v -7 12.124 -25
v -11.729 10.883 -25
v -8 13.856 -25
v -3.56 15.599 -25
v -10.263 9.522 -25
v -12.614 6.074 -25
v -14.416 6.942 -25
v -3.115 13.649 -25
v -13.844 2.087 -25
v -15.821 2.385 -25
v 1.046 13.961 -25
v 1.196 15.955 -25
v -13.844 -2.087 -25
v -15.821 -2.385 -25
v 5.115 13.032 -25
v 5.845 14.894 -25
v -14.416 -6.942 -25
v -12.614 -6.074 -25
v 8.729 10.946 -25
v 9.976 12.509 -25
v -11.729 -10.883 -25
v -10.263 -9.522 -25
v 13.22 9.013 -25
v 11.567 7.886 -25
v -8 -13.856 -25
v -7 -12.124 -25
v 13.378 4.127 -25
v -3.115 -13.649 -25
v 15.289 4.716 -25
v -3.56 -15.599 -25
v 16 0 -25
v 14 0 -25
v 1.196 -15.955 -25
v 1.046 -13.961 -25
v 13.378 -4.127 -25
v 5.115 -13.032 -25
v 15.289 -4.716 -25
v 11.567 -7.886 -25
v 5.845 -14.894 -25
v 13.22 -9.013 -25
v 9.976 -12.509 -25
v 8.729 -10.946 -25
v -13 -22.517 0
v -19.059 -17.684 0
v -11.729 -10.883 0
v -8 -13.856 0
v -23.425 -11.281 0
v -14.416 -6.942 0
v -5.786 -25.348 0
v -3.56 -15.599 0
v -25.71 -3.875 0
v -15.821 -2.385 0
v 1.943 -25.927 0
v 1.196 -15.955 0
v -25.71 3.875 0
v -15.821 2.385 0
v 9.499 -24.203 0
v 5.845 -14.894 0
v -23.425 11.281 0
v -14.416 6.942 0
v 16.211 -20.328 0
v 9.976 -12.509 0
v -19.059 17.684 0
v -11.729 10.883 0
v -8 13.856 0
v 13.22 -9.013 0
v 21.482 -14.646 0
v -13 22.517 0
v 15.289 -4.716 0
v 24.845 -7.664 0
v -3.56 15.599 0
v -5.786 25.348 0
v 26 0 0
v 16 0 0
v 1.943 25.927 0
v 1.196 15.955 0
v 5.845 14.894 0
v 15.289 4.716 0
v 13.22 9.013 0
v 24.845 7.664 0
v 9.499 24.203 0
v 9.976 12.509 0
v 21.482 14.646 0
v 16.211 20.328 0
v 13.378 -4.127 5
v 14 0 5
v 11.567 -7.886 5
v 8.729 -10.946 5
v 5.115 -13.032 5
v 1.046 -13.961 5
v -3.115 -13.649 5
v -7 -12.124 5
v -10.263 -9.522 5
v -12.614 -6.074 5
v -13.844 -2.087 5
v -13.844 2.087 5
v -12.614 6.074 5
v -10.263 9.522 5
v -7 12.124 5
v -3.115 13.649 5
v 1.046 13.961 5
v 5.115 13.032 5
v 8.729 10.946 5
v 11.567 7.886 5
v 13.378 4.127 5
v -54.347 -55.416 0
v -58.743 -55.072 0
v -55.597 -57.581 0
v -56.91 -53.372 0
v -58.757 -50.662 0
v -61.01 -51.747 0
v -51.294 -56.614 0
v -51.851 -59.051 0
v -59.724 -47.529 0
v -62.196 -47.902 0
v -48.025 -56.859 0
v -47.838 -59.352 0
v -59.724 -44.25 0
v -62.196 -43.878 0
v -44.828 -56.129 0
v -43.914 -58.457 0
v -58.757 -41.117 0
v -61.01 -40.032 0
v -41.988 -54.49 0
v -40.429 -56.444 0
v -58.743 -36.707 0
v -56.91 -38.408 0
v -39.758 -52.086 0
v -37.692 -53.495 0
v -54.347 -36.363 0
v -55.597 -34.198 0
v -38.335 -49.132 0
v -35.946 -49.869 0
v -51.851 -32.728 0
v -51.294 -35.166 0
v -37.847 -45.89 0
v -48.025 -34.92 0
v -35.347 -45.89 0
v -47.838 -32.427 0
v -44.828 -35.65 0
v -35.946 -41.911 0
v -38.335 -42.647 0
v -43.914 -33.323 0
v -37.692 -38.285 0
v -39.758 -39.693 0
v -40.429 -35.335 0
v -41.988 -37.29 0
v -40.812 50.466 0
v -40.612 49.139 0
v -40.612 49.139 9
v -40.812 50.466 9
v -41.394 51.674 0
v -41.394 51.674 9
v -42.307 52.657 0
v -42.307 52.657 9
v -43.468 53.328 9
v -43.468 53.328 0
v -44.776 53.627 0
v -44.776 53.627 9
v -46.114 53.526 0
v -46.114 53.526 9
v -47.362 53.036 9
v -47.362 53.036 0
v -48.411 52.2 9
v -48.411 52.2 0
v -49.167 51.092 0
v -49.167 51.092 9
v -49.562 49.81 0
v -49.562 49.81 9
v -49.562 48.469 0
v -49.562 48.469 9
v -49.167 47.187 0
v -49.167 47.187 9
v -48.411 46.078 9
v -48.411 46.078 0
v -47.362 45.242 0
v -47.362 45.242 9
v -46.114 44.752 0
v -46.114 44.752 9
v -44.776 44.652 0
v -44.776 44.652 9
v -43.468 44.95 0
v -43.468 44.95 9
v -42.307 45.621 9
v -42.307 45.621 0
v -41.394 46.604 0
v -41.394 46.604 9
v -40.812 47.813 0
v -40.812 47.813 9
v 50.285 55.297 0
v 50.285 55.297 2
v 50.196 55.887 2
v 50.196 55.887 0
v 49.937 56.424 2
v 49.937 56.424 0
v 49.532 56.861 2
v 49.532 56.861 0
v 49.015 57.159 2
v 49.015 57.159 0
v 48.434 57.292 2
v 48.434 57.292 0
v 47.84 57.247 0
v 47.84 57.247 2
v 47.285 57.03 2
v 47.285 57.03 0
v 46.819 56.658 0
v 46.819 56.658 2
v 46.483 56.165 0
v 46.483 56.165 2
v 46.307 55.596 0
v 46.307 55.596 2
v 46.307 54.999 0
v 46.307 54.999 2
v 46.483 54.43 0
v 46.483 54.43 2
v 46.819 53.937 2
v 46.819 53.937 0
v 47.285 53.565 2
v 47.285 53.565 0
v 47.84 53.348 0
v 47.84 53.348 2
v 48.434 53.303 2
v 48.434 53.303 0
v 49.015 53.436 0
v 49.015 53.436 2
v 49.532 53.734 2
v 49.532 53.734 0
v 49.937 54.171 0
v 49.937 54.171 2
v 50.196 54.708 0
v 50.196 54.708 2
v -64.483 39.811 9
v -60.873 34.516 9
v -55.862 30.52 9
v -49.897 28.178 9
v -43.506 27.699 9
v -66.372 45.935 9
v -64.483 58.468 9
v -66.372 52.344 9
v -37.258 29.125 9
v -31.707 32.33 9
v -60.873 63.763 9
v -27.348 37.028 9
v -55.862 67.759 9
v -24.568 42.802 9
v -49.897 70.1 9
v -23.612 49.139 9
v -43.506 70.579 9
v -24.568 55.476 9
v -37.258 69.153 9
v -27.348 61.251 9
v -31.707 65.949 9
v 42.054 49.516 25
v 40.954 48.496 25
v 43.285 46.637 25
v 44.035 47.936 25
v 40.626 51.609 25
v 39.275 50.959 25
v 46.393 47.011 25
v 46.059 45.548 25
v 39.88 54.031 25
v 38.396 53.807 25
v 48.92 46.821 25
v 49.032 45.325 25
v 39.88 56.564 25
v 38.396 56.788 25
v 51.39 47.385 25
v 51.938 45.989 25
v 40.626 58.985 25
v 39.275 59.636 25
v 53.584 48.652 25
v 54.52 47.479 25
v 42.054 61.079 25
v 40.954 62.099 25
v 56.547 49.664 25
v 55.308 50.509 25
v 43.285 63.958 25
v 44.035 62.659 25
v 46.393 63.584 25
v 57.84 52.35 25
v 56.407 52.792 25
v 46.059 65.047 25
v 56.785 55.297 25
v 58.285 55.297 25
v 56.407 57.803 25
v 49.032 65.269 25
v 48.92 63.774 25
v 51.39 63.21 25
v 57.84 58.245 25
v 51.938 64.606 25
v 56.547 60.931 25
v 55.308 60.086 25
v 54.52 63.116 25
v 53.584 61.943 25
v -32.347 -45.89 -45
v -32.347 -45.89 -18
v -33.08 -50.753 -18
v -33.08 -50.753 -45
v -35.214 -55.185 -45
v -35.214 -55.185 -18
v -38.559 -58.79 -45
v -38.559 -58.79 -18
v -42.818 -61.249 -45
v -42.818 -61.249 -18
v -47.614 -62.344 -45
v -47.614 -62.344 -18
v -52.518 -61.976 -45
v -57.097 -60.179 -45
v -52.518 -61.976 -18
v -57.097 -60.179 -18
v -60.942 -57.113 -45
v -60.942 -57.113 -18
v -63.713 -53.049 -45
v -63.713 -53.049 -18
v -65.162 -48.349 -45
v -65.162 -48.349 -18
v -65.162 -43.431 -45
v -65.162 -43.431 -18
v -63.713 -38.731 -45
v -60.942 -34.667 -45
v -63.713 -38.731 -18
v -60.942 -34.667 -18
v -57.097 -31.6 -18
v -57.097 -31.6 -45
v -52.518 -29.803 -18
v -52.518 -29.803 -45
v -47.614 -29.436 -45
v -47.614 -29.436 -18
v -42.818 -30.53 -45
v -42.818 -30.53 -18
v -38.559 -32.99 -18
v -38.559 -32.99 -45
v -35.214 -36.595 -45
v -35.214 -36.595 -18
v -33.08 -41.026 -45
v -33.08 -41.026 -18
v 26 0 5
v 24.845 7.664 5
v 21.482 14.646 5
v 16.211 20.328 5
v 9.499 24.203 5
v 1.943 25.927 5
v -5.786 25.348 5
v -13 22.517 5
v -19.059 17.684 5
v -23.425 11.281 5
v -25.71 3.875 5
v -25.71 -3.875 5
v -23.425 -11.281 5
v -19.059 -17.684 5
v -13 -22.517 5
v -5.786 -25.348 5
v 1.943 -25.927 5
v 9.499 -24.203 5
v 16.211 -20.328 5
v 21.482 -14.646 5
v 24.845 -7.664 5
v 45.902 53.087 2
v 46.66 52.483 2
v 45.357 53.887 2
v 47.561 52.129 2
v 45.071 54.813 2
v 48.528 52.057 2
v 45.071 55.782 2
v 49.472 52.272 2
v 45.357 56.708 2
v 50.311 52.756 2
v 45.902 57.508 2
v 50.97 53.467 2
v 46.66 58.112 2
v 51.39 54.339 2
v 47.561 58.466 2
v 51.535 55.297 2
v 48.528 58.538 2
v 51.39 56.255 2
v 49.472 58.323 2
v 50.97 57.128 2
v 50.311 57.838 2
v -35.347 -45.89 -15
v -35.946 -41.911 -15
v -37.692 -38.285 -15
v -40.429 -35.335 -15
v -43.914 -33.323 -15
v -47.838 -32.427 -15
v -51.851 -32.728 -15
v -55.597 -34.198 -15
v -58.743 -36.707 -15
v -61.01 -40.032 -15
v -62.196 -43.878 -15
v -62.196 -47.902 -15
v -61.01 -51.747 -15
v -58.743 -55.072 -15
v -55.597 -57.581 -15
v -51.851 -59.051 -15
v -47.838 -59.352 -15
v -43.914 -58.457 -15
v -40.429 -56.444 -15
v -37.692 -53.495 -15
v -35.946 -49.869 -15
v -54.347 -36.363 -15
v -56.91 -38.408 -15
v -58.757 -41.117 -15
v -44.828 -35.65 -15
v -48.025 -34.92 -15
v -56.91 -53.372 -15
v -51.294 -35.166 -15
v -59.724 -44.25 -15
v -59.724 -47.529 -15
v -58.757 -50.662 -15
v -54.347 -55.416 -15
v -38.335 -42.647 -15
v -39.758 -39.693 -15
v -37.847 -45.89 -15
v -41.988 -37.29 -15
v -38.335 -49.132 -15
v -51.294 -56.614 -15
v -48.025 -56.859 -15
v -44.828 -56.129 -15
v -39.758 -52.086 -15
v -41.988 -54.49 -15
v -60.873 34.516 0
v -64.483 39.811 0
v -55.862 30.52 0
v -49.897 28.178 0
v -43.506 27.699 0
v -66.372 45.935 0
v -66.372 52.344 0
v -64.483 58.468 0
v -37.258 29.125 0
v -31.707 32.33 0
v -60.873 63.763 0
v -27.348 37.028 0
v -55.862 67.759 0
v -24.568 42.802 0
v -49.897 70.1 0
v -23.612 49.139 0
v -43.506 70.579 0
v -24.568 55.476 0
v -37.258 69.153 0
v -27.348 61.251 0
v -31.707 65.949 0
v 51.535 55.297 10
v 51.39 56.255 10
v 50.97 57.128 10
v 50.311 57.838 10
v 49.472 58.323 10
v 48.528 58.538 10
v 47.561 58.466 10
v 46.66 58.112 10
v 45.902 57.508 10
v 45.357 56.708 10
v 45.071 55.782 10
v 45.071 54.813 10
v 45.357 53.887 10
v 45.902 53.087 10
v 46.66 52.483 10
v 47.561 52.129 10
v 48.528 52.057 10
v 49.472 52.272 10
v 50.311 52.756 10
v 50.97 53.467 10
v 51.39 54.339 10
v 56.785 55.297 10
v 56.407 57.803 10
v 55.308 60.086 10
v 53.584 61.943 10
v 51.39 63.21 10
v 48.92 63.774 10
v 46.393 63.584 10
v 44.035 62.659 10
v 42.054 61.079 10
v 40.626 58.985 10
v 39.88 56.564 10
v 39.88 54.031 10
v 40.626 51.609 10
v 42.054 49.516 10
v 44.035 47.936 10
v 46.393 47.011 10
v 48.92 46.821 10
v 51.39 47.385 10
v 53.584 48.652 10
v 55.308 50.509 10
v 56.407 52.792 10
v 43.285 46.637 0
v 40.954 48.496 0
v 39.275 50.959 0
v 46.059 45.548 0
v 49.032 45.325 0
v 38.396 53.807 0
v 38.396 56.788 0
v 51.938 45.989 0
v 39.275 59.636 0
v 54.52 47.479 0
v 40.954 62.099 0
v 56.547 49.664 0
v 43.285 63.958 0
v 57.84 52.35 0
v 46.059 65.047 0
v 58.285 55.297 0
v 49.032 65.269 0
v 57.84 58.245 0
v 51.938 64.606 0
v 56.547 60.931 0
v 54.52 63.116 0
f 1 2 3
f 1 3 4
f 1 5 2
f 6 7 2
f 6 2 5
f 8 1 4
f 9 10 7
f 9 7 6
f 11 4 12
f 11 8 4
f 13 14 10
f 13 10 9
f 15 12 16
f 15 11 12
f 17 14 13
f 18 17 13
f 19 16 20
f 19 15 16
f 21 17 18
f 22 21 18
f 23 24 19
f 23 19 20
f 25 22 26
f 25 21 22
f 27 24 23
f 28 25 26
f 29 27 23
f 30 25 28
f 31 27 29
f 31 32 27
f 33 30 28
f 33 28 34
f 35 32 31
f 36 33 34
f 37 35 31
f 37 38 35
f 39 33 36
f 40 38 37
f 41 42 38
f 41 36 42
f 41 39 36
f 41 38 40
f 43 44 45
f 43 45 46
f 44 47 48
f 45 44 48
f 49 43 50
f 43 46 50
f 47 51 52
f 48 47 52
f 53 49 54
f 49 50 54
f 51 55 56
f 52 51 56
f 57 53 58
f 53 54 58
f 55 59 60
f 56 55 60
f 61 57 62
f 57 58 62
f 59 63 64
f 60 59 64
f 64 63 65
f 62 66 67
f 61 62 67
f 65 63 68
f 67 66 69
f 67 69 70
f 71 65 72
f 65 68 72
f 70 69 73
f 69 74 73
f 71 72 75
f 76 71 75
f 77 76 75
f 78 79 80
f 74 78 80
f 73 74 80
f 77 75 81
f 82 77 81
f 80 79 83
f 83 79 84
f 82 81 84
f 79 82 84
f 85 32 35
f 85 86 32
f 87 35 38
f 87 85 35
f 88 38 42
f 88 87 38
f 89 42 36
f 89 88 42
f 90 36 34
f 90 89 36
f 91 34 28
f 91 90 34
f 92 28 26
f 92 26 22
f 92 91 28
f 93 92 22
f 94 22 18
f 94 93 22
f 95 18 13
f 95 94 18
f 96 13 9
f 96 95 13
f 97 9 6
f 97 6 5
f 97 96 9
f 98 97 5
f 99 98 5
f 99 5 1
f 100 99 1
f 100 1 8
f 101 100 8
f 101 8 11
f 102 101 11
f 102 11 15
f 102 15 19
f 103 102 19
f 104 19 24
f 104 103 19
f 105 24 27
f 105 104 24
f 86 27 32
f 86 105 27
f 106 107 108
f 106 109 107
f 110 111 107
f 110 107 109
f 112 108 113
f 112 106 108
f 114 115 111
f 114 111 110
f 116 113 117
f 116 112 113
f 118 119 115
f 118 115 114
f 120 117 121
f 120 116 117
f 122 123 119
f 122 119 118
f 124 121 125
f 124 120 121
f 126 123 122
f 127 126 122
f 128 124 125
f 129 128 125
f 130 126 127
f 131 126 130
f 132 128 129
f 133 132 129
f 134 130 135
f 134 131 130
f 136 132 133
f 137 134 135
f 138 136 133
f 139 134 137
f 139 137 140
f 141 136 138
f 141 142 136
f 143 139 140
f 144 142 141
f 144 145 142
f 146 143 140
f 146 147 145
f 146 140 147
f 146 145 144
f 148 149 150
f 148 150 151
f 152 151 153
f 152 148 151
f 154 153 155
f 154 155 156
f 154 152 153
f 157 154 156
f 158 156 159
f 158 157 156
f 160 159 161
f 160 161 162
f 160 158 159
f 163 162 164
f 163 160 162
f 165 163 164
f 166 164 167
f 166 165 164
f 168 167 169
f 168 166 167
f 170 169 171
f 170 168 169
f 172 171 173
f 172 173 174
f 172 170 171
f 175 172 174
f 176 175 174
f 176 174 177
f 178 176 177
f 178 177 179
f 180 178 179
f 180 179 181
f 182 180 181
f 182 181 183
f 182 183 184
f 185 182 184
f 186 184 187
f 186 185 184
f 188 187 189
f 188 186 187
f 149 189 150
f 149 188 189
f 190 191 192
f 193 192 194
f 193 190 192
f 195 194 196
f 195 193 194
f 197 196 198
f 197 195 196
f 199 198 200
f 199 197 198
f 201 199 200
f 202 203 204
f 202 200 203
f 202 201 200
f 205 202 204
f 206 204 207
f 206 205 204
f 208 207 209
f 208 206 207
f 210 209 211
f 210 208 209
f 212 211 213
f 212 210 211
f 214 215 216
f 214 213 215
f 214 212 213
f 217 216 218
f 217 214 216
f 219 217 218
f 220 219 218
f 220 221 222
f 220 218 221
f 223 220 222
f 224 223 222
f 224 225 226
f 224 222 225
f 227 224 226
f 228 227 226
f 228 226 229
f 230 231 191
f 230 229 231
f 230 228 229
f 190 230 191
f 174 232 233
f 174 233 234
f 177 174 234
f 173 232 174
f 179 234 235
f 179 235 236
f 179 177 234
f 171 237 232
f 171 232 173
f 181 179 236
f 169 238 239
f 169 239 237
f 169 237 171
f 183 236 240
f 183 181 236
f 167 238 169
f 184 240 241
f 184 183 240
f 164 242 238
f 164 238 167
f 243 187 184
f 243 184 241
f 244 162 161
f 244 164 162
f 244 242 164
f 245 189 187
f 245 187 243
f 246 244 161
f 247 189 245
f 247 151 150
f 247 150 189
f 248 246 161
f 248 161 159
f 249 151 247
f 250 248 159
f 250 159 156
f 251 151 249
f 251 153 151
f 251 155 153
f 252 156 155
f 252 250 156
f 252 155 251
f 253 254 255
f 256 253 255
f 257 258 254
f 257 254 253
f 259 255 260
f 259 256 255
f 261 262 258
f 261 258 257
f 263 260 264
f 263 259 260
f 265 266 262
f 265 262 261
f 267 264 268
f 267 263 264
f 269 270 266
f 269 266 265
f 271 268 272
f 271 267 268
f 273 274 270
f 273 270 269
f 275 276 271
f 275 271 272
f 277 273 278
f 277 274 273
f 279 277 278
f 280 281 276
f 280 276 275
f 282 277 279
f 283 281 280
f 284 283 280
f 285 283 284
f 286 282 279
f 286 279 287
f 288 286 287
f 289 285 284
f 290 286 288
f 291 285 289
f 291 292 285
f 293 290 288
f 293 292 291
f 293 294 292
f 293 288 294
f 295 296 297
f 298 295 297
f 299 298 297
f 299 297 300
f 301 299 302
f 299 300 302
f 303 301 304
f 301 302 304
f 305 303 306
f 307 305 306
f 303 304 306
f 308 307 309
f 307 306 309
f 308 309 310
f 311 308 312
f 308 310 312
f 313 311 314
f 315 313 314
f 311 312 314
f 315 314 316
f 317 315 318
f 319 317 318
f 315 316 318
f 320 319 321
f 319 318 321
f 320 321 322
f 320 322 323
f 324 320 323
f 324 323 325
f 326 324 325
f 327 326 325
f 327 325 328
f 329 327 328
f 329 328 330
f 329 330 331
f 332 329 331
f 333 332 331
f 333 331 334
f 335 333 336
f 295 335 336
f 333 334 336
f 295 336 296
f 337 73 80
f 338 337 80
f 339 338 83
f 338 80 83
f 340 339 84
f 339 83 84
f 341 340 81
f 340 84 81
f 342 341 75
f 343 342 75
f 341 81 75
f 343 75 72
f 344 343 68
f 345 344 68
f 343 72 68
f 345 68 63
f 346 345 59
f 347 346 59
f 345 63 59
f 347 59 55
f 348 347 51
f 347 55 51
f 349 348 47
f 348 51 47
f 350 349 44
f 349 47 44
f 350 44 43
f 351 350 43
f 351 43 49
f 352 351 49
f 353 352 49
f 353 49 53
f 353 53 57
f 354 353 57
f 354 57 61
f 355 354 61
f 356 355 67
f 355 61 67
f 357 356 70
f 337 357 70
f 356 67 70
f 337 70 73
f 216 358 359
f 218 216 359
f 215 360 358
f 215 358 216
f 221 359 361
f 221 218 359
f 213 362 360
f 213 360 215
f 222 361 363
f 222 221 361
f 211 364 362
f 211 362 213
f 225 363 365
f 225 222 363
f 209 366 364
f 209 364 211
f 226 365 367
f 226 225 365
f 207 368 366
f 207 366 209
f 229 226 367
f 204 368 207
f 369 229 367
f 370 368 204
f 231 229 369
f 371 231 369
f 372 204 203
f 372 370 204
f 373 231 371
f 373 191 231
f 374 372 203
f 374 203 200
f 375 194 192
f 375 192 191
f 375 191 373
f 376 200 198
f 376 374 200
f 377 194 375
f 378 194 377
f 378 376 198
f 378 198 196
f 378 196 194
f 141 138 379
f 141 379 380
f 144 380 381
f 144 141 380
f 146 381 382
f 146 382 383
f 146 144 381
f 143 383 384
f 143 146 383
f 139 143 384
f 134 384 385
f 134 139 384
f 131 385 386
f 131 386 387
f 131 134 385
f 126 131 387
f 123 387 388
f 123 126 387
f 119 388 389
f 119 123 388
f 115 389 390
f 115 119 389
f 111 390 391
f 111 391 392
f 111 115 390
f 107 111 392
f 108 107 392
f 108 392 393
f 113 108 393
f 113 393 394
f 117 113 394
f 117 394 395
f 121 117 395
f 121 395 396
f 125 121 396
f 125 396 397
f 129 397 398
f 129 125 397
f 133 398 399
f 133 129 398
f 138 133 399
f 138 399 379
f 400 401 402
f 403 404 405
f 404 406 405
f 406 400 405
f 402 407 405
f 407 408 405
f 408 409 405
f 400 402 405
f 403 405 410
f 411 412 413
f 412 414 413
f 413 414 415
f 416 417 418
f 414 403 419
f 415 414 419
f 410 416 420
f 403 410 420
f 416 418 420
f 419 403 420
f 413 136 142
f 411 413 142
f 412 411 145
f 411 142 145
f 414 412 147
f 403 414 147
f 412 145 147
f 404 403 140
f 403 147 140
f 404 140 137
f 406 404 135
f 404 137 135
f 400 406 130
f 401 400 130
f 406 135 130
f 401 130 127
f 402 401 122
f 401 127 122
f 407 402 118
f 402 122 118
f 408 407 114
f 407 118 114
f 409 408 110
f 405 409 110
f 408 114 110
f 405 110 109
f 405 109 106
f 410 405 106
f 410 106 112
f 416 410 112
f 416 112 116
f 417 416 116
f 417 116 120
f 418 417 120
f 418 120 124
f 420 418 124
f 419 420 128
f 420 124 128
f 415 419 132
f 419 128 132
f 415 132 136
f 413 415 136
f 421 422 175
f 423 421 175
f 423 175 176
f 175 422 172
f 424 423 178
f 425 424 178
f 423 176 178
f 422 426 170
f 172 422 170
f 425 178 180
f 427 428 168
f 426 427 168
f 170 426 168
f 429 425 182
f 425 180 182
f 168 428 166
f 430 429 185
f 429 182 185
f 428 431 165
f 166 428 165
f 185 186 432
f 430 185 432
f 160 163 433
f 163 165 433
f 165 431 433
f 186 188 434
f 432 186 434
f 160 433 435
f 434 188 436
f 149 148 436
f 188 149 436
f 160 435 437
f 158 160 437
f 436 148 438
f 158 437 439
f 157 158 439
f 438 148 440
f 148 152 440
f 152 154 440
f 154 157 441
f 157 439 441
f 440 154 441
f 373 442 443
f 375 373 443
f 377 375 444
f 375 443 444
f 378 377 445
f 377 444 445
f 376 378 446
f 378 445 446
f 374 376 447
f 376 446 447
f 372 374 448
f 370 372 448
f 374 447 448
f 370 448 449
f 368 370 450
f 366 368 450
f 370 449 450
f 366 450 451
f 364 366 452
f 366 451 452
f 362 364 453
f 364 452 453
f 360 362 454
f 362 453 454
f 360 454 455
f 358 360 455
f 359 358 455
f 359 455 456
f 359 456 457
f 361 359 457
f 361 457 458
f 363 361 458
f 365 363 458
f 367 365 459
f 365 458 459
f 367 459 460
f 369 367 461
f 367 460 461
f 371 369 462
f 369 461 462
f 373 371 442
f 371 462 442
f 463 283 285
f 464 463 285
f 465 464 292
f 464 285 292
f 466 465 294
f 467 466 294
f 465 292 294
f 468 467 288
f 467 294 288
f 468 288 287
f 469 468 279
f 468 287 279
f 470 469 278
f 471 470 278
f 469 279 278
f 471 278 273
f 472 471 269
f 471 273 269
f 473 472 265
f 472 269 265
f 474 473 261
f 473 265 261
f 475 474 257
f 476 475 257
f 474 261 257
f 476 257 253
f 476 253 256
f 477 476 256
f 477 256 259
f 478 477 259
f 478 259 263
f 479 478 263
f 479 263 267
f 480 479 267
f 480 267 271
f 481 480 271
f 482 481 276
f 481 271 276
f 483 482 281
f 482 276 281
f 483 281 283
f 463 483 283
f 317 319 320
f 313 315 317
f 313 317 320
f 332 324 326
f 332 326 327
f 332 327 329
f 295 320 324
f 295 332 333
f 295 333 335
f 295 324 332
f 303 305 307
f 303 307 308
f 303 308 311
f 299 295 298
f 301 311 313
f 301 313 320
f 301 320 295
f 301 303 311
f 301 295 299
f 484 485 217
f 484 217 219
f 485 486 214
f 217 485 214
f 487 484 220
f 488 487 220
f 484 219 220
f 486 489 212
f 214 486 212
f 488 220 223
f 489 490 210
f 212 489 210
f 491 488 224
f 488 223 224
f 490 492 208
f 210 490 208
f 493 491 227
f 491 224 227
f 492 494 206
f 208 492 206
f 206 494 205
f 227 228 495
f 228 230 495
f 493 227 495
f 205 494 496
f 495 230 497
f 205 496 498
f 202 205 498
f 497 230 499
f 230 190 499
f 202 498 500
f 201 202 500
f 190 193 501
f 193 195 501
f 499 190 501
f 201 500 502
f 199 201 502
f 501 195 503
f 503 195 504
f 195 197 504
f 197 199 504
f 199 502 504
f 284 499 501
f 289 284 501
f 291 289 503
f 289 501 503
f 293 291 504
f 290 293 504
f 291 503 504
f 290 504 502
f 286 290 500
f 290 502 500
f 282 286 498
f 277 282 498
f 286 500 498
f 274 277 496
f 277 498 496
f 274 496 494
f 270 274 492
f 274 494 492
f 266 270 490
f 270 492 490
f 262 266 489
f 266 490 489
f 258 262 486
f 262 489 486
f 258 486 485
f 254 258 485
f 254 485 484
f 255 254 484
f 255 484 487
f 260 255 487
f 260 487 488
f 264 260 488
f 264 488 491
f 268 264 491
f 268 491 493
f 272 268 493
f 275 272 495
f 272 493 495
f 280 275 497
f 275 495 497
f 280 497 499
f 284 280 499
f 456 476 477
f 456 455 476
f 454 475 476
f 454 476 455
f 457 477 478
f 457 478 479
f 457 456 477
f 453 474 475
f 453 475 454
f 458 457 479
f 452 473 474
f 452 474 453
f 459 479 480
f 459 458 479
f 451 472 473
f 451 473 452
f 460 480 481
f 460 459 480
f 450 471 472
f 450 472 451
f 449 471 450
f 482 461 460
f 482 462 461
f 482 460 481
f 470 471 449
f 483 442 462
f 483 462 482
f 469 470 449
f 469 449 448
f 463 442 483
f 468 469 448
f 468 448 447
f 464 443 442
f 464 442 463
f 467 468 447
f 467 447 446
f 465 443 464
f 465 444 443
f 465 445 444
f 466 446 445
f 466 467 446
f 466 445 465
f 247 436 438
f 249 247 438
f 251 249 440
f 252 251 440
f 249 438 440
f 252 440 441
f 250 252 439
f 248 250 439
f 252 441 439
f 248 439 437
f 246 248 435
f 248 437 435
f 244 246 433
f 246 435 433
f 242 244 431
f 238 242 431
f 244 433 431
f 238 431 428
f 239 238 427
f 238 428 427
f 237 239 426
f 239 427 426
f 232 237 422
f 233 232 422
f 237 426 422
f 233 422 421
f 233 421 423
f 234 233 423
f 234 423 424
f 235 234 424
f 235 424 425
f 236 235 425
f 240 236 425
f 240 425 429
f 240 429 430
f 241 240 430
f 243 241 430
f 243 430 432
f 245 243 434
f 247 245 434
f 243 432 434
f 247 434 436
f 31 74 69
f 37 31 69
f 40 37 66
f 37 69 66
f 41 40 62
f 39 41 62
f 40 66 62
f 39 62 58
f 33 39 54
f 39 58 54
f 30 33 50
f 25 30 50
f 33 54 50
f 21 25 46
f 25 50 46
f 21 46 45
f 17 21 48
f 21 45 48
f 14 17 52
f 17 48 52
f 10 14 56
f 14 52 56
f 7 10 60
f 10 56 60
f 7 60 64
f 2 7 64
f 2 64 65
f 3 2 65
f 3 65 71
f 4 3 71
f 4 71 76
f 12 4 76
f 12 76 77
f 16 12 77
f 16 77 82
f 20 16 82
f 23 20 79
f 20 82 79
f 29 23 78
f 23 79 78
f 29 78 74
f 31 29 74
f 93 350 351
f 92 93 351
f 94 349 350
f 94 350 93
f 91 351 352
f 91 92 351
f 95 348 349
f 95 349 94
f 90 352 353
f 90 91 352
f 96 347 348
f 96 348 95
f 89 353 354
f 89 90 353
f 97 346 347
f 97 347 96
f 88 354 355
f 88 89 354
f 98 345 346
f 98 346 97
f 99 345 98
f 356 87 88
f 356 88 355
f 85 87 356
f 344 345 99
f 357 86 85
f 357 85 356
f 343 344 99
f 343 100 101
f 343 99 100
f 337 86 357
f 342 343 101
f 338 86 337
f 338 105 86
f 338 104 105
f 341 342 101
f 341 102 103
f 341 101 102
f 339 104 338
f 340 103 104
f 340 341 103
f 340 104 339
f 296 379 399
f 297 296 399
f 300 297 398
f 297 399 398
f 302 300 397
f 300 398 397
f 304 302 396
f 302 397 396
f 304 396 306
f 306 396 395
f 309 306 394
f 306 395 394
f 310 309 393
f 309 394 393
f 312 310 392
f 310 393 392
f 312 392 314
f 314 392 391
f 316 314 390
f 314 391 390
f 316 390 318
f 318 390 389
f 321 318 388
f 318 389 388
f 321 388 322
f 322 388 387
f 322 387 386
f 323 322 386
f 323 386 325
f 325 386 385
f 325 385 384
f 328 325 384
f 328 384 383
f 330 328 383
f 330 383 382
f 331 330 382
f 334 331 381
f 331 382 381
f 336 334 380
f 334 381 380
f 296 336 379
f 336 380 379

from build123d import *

# Parameters (mm, degrees)
F0_R      = 26
F0_R_2    = 14
F1_DEPTH  = 5
F2_R      = 16
F2_R_2    = 14
F3_DEPTH  = 25
F4_R      = 13.5
F4_R_2    = 11
F5_DEPTH  = 15
F6_R      = 16.5
F7_DEPTH  = 30
F8_SIZE2  = 2.99999
F8_SIZE   = 2.99999
F9_R      = 10
F9_R_2    = 2
F10_DEPTH = 25
F11_R     = 8.5
F12_DEPTH = 15
F13_R     = 3.25
F14_DEPTH = 8
F15_R     = 21.5
F15_R_2   = 4.5
F16_DEPTH = 9


# Not quite as in the source:
# - a fillet or chamfer is up to 0.001 mm smaller than in the source, because OpenCascade refuses the exact size


with BuildPart() as f1:
    # F0 (on Top) → F1 (new body)
    with BuildSketch(Plane.XY):
        Circle(F0_R)
        Circle(F0_R_2, mode=Mode.SUBTRACT)
    extrude(amount=F1_DEPTH)

    # F2 (on face) → F3 (join)
    with BuildSketch(Plane(origin=(0, 0, 0), x_dir=(1, 0, 0), z_dir=(0, 0, -1))):
        Circle(F2_R)
        Circle(F2_R_2, mode=Mode.SUBTRACT)
    extrude(amount=F3_DEPTH)


with BuildPart() as f5:
    # F4 (on Top) → F5 (new body)
    with BuildSketch(Plane.XY):
        with Locations((-48.8465763628, -45.8897389472)):
            Circle(F4_R)
        with Locations((-48.8465763628, -45.8897389472)):
            Circle(F4_R_2, mode=Mode.SUBTRACT)
    extrude(amount=-F5_DEPTH)

    # F6 (on face) → F7 (join)
    with BuildSketch(Plane(origin=(0, 0, -15), x_dir=(1, 0, 0), z_dir=(0, 0, -1))):
        with Locations((-48.8465763628, 45.8897389472)):
            Circle(F6_R)
    extrude(amount=F7_DEPTH)

    # F8 (size 3 and 3 in the source; OpenCascade refuses exactly that, so slightly less here)
    f8_edges = [f5.edges().sort_by_distance(p)[0] for p in [
        (-65.346576, -45.889739, -15),
    ]]
    chamfer(f8_edges, length=F8_SIZE, length2=F8_SIZE2)


with BuildPart() as f10:
    # F9 (on Top) → F10 (new body)
    with BuildSketch(Plane.XY):
        with Locations((48.2846722007, 55.2974492311)):
            Circle(F9_R)
        with Locations((48.2846722007, 55.2974492311)):
            Circle(F9_R_2, mode=Mode.SUBTRACT)
    extrude(amount=F10_DEPTH)

    # F11 (on face) → F12 (cut)
    with BuildSketch(Plane.XY.offset(25)):
        with Locations((48.2846722007, 55.2974492311)):
            Circle(F11_R)
    extrude(amount=-F12_DEPTH, mode=Mode.SUBTRACT)

    # F13 (on face) → F14 (cut)
    with BuildSketch(Plane.XY.offset(10)):
        with Locations((48.2846722007, 55.2974492311)):
            Circle(F13_R)
    extrude(amount=-F14_DEPTH, mode=Mode.SUBTRACT)


with BuildPart() as f16:
    # F15 (on Top) → F16 (new body)
    with BuildSketch(Plane.XY):
        with Locations((-45.1123826206, 49.1392202675)):
            Circle(F15_R)
        with Locations((-45.1123826206, 49.1392202675)):
            Circle(F15_R_2, mode=Mode.SUBTRACT)
    extrude(amount=F16_DEPTH)


solid = Compound([f1.part, f5.part, f10.part, f16.part])
